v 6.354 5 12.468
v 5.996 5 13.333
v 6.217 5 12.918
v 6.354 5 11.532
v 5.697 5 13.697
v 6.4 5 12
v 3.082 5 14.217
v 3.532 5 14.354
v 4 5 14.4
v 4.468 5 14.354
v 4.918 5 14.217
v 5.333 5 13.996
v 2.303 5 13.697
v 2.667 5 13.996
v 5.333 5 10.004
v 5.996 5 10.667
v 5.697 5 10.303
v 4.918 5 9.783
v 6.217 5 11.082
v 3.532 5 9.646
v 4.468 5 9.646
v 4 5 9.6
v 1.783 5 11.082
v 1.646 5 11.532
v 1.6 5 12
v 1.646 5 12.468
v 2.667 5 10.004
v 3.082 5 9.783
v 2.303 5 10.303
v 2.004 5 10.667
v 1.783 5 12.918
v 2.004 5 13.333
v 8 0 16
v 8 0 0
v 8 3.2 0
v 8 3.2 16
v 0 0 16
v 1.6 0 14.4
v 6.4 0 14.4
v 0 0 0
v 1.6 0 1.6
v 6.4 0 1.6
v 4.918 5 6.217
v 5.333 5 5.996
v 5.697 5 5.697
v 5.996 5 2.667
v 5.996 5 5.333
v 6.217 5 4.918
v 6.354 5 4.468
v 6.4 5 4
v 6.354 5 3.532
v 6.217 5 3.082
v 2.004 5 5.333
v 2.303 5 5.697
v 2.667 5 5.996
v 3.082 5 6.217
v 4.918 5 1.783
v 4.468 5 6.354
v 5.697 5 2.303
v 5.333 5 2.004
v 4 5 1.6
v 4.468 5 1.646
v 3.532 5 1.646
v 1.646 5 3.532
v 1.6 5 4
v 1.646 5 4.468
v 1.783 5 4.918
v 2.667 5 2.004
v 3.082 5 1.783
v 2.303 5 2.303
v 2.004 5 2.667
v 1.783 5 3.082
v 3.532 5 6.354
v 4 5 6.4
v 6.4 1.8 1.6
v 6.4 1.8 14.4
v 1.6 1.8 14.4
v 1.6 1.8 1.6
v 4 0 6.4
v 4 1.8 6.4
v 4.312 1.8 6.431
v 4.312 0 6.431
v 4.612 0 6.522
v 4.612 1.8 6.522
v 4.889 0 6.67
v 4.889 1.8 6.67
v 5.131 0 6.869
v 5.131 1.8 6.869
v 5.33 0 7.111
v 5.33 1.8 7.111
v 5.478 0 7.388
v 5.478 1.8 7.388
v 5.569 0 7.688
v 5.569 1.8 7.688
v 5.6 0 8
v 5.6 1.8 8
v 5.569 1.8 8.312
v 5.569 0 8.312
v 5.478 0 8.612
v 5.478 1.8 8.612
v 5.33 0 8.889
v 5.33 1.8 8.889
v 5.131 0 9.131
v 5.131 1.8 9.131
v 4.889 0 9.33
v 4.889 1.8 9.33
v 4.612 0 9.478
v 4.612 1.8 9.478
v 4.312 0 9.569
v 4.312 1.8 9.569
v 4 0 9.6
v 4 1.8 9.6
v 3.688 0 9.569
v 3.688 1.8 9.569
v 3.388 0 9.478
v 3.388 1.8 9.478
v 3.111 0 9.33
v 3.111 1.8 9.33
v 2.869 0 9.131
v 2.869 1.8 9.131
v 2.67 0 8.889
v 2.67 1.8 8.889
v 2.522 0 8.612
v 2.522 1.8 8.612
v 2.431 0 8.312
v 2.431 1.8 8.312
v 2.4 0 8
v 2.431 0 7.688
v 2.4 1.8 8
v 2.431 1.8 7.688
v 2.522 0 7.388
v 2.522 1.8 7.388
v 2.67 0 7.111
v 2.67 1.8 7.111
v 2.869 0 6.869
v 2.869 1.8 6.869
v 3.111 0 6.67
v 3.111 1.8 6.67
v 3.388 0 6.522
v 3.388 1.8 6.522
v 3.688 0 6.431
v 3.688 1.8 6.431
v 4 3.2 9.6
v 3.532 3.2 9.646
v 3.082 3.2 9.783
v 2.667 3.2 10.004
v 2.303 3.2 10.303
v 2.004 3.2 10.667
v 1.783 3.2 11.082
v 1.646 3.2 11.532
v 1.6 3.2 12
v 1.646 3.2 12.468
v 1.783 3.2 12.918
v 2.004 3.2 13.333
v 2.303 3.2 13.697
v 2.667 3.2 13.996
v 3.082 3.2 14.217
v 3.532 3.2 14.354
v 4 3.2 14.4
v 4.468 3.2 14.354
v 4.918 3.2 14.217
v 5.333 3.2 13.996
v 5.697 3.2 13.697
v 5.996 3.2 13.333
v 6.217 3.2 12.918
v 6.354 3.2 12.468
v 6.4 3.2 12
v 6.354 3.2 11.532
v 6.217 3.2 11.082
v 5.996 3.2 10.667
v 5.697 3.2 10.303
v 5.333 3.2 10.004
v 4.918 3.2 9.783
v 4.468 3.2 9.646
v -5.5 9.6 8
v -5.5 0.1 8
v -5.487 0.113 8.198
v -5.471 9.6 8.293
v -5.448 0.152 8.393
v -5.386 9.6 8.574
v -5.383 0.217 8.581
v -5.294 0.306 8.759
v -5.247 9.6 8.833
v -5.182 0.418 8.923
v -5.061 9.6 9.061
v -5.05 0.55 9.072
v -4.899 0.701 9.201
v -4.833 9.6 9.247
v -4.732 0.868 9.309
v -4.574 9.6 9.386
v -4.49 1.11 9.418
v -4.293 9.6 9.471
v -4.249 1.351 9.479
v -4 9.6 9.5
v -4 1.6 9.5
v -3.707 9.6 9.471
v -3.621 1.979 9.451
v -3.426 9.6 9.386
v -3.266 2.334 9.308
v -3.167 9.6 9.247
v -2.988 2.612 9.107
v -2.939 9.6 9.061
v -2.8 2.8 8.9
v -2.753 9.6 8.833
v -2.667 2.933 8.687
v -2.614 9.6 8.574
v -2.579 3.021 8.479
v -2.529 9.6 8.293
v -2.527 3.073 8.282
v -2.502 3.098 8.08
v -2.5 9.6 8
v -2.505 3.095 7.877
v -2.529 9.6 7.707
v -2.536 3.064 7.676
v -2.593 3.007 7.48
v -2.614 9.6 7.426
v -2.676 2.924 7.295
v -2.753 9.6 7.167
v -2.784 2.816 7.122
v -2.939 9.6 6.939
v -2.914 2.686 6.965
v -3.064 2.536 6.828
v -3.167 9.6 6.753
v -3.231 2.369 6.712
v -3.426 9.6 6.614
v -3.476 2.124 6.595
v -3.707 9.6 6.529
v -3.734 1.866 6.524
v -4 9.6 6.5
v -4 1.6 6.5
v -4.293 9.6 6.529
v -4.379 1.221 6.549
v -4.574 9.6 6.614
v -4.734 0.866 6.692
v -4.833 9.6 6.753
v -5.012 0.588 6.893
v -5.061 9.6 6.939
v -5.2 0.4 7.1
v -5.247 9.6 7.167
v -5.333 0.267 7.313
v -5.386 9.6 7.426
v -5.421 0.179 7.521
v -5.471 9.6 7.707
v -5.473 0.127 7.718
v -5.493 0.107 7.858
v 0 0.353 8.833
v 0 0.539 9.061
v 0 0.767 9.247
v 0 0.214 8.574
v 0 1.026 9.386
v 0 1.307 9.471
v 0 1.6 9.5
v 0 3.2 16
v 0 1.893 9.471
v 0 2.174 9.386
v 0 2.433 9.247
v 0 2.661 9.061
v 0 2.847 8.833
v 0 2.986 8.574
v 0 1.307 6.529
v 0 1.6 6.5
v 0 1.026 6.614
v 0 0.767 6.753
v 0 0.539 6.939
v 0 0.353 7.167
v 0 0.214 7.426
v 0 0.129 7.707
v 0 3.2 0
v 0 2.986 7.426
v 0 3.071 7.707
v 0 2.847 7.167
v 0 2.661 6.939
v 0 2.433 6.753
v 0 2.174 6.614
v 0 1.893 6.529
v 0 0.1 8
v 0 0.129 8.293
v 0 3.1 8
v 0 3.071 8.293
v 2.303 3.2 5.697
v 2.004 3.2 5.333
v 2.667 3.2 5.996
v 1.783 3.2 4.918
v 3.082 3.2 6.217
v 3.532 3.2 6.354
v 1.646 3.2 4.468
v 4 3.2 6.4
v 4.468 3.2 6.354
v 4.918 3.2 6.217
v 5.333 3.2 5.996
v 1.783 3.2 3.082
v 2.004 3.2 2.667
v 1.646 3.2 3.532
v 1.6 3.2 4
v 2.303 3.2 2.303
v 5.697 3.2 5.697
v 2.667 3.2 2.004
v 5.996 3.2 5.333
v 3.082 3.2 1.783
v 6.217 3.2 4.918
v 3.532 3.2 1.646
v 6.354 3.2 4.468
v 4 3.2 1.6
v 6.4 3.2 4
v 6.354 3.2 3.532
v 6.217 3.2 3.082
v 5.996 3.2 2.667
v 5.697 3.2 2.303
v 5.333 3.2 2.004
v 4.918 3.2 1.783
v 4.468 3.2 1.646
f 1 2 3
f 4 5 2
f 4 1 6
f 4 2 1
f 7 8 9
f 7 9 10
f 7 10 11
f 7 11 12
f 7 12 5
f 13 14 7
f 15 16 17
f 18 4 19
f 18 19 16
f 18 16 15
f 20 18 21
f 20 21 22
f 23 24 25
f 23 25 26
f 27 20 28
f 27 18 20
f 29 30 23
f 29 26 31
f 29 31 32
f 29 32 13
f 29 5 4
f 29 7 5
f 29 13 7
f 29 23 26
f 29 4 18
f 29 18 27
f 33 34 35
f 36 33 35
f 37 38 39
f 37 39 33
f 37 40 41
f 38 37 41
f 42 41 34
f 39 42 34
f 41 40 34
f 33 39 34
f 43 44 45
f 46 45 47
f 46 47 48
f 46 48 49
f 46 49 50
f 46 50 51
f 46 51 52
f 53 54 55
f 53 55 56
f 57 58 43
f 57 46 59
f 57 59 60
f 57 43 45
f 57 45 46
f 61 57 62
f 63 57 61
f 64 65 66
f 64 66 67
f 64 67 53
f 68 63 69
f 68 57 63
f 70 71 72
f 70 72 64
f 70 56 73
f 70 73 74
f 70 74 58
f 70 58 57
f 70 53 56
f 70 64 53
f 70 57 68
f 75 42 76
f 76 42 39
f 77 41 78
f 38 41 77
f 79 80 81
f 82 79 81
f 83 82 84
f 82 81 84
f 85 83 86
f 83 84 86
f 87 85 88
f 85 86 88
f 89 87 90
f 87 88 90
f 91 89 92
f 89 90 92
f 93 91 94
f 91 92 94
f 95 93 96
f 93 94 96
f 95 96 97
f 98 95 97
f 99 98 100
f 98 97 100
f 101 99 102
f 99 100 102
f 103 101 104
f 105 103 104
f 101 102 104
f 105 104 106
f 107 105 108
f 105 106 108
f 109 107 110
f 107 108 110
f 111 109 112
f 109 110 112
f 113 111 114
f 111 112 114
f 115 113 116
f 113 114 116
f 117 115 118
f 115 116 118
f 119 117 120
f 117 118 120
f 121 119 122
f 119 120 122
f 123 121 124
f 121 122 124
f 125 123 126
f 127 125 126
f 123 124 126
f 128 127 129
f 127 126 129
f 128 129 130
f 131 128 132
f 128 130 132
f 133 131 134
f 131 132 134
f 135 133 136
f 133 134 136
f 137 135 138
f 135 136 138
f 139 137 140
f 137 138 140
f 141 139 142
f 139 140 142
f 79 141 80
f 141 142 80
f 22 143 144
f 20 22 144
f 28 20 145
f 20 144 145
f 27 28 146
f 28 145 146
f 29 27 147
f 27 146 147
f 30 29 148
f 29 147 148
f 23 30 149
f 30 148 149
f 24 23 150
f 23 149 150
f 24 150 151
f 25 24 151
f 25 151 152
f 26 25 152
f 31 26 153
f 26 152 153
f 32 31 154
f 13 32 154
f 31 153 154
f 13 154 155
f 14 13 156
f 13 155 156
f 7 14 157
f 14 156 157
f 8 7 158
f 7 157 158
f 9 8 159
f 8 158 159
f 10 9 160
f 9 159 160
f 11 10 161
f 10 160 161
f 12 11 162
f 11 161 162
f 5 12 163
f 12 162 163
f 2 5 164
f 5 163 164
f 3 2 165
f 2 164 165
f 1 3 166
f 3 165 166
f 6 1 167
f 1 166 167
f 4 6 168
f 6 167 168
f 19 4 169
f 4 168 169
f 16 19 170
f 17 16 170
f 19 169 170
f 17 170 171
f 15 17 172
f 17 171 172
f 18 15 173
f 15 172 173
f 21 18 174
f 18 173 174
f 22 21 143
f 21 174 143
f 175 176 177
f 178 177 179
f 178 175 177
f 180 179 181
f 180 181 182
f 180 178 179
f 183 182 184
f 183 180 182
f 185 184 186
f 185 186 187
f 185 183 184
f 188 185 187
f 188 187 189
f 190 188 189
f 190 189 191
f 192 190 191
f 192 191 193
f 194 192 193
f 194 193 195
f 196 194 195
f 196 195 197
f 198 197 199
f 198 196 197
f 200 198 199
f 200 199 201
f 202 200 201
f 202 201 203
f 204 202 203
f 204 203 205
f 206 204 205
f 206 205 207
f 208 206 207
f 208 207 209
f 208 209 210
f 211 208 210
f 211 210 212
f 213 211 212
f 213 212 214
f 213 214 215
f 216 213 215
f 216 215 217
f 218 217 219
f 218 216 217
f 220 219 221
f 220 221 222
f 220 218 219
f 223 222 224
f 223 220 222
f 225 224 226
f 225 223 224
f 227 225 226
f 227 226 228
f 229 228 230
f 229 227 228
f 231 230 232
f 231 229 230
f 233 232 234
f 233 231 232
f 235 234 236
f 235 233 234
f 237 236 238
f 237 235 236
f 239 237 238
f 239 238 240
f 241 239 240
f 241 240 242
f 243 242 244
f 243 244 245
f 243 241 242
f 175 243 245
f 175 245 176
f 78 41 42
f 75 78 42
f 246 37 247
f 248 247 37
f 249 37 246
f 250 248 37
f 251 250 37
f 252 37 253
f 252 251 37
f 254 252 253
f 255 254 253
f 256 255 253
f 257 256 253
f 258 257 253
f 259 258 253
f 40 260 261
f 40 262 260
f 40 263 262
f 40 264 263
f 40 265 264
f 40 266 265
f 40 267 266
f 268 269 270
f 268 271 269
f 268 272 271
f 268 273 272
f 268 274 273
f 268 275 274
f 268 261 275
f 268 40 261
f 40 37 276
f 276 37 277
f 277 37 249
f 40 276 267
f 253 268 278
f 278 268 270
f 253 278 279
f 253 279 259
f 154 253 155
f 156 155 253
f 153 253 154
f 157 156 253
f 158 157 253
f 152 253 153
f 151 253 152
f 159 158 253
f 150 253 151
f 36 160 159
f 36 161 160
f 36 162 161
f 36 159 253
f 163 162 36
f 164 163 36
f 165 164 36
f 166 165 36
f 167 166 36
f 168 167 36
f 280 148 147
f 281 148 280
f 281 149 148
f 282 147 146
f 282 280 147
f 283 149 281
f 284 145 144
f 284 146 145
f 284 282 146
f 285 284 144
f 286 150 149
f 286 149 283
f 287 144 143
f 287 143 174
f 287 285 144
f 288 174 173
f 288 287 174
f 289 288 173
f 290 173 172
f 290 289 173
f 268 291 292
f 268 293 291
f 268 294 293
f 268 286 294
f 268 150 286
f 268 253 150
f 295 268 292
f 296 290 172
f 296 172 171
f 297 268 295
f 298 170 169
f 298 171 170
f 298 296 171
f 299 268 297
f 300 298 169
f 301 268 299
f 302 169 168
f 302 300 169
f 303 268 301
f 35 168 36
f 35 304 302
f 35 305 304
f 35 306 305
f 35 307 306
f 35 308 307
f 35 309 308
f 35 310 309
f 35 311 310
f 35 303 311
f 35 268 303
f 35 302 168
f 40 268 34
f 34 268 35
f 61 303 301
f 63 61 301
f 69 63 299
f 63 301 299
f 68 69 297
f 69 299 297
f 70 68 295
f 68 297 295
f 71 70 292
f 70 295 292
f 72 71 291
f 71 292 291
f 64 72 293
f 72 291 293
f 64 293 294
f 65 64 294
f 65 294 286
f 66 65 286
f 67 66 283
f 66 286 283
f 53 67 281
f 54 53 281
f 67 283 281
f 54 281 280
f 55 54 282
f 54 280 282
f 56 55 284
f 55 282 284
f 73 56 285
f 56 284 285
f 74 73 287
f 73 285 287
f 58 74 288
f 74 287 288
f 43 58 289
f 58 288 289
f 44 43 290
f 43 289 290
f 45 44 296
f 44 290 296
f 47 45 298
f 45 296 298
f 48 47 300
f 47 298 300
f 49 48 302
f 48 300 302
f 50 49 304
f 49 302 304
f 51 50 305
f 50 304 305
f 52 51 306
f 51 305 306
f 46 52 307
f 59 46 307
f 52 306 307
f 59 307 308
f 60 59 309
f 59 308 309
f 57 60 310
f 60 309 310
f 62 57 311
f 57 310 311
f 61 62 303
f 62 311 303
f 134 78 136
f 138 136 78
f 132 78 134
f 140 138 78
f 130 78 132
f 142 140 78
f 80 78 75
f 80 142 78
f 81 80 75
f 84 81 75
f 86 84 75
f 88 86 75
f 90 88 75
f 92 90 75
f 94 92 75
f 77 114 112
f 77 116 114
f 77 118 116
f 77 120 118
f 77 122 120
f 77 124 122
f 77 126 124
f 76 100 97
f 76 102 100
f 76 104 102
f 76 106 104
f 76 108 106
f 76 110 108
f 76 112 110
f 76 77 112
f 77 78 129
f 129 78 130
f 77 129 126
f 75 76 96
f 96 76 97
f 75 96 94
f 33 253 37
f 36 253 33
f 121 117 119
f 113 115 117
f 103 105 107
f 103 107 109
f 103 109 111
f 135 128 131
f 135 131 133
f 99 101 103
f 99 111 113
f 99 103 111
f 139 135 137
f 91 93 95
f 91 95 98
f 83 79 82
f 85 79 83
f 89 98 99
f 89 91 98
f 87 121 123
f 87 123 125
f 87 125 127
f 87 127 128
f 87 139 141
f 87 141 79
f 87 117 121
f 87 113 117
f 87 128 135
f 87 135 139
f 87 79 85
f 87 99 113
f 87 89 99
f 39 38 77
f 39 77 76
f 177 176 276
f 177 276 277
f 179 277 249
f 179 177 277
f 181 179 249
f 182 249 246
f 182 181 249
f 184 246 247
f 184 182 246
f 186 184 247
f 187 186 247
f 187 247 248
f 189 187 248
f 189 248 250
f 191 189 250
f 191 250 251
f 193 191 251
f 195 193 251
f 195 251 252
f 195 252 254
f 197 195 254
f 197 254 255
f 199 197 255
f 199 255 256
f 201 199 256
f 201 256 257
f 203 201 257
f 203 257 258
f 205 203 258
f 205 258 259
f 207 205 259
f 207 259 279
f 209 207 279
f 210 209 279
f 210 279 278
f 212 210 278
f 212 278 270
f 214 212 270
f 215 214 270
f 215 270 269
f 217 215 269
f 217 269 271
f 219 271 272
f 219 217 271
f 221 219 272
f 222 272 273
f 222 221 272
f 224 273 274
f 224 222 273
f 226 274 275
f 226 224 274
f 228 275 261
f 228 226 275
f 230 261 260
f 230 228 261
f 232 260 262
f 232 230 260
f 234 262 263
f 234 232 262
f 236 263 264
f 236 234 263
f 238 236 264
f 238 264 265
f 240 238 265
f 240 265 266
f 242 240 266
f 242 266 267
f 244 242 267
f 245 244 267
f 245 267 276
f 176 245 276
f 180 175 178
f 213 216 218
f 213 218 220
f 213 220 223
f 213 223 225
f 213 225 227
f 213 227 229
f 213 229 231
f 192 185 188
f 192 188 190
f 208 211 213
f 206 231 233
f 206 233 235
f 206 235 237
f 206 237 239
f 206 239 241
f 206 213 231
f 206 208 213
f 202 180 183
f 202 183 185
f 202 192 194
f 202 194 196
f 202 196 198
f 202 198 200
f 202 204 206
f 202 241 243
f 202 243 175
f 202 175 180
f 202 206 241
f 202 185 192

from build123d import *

# Parameters (mm, degrees)
SKETCH1_W           = 8
SKETCH1_H           = 3.2
BOSS_EXTRUDE1_DEPTH = 16
SKETCH2_W           = 4.8
SKETCH2_H           = 12.8
CUT_EXTRUDE1_DEPTH  = 1.8
SKETCH3_R           = 2.4
BOSS_EXTRUDE2_DEPTH = 1.8
SKETCH4_R           = 1.6
BOSS_EXTRUDE3_DEPTH = 1.8
SWEEP1_PROFILE_R    = 1.5


with BuildPart() as part:
    # Sketch1 → Boss-Extrude1 (new body)
    with BuildSketch(Plane.XY):
        with Locations((4, 1.6)):
            Rectangle(SKETCH1_W, SKETCH1_H)
    extrude(amount=BOSS_EXTRUDE1_DEPTH)

    # Sketch2 → Cut-Extrude1 (cut)
    with BuildSketch(Plane.XZ):
        with Locations((4, 8)):
            Rectangle(SKETCH2_W, SKETCH2_H)
    extrude(amount=-CUT_EXTRUDE1_DEPTH, mode=Mode.SUBTRACT)

    # Sketch3 → Boss-Extrude2 (add)
    with BuildSketch(Plane(origin=(0, 3.2, 0), x_dir=(1, 0, 0), z_dir=(0, 1, 0))):
        with Locations((4, -4)):
            Circle(SKETCH3_R)
        with Locations((4, -12)):
            Circle(SKETCH3_R)
    extrude(amount=BOSS_EXTRUDE2_DEPTH)

    # Sketch4 → Boss-Extrude3 (add)
    with BuildSketch(Plane.XZ.offset(-1.8)):
        with Locations((4, 8)):
            Circle(SKETCH4_R)
    extrude(amount=BOSS_EXTRUDE3_DEPTH)

    # Sweep1: sweep along a path in Sketch6
    with BuildLine(Plane.XY.offset(8)) as sweep1_path:
        Line((0, 1.6), (-4, 1.6))
        Line((-4, 1.6), (-4, 9.6))
    # Sweep1 profile (on start of the path) → Sweep1 (sweep)
    with BuildSketch(Plane(origin=(0, 1.6, 8), x_dir=(0, -1, 0), z_dir=(-1, 0, 0))):
        Circle(SWEEP1_PROFILE_R)
    sweep(path=sweep1_path.line, transition=Transition.RIGHT)


solid = part.part
